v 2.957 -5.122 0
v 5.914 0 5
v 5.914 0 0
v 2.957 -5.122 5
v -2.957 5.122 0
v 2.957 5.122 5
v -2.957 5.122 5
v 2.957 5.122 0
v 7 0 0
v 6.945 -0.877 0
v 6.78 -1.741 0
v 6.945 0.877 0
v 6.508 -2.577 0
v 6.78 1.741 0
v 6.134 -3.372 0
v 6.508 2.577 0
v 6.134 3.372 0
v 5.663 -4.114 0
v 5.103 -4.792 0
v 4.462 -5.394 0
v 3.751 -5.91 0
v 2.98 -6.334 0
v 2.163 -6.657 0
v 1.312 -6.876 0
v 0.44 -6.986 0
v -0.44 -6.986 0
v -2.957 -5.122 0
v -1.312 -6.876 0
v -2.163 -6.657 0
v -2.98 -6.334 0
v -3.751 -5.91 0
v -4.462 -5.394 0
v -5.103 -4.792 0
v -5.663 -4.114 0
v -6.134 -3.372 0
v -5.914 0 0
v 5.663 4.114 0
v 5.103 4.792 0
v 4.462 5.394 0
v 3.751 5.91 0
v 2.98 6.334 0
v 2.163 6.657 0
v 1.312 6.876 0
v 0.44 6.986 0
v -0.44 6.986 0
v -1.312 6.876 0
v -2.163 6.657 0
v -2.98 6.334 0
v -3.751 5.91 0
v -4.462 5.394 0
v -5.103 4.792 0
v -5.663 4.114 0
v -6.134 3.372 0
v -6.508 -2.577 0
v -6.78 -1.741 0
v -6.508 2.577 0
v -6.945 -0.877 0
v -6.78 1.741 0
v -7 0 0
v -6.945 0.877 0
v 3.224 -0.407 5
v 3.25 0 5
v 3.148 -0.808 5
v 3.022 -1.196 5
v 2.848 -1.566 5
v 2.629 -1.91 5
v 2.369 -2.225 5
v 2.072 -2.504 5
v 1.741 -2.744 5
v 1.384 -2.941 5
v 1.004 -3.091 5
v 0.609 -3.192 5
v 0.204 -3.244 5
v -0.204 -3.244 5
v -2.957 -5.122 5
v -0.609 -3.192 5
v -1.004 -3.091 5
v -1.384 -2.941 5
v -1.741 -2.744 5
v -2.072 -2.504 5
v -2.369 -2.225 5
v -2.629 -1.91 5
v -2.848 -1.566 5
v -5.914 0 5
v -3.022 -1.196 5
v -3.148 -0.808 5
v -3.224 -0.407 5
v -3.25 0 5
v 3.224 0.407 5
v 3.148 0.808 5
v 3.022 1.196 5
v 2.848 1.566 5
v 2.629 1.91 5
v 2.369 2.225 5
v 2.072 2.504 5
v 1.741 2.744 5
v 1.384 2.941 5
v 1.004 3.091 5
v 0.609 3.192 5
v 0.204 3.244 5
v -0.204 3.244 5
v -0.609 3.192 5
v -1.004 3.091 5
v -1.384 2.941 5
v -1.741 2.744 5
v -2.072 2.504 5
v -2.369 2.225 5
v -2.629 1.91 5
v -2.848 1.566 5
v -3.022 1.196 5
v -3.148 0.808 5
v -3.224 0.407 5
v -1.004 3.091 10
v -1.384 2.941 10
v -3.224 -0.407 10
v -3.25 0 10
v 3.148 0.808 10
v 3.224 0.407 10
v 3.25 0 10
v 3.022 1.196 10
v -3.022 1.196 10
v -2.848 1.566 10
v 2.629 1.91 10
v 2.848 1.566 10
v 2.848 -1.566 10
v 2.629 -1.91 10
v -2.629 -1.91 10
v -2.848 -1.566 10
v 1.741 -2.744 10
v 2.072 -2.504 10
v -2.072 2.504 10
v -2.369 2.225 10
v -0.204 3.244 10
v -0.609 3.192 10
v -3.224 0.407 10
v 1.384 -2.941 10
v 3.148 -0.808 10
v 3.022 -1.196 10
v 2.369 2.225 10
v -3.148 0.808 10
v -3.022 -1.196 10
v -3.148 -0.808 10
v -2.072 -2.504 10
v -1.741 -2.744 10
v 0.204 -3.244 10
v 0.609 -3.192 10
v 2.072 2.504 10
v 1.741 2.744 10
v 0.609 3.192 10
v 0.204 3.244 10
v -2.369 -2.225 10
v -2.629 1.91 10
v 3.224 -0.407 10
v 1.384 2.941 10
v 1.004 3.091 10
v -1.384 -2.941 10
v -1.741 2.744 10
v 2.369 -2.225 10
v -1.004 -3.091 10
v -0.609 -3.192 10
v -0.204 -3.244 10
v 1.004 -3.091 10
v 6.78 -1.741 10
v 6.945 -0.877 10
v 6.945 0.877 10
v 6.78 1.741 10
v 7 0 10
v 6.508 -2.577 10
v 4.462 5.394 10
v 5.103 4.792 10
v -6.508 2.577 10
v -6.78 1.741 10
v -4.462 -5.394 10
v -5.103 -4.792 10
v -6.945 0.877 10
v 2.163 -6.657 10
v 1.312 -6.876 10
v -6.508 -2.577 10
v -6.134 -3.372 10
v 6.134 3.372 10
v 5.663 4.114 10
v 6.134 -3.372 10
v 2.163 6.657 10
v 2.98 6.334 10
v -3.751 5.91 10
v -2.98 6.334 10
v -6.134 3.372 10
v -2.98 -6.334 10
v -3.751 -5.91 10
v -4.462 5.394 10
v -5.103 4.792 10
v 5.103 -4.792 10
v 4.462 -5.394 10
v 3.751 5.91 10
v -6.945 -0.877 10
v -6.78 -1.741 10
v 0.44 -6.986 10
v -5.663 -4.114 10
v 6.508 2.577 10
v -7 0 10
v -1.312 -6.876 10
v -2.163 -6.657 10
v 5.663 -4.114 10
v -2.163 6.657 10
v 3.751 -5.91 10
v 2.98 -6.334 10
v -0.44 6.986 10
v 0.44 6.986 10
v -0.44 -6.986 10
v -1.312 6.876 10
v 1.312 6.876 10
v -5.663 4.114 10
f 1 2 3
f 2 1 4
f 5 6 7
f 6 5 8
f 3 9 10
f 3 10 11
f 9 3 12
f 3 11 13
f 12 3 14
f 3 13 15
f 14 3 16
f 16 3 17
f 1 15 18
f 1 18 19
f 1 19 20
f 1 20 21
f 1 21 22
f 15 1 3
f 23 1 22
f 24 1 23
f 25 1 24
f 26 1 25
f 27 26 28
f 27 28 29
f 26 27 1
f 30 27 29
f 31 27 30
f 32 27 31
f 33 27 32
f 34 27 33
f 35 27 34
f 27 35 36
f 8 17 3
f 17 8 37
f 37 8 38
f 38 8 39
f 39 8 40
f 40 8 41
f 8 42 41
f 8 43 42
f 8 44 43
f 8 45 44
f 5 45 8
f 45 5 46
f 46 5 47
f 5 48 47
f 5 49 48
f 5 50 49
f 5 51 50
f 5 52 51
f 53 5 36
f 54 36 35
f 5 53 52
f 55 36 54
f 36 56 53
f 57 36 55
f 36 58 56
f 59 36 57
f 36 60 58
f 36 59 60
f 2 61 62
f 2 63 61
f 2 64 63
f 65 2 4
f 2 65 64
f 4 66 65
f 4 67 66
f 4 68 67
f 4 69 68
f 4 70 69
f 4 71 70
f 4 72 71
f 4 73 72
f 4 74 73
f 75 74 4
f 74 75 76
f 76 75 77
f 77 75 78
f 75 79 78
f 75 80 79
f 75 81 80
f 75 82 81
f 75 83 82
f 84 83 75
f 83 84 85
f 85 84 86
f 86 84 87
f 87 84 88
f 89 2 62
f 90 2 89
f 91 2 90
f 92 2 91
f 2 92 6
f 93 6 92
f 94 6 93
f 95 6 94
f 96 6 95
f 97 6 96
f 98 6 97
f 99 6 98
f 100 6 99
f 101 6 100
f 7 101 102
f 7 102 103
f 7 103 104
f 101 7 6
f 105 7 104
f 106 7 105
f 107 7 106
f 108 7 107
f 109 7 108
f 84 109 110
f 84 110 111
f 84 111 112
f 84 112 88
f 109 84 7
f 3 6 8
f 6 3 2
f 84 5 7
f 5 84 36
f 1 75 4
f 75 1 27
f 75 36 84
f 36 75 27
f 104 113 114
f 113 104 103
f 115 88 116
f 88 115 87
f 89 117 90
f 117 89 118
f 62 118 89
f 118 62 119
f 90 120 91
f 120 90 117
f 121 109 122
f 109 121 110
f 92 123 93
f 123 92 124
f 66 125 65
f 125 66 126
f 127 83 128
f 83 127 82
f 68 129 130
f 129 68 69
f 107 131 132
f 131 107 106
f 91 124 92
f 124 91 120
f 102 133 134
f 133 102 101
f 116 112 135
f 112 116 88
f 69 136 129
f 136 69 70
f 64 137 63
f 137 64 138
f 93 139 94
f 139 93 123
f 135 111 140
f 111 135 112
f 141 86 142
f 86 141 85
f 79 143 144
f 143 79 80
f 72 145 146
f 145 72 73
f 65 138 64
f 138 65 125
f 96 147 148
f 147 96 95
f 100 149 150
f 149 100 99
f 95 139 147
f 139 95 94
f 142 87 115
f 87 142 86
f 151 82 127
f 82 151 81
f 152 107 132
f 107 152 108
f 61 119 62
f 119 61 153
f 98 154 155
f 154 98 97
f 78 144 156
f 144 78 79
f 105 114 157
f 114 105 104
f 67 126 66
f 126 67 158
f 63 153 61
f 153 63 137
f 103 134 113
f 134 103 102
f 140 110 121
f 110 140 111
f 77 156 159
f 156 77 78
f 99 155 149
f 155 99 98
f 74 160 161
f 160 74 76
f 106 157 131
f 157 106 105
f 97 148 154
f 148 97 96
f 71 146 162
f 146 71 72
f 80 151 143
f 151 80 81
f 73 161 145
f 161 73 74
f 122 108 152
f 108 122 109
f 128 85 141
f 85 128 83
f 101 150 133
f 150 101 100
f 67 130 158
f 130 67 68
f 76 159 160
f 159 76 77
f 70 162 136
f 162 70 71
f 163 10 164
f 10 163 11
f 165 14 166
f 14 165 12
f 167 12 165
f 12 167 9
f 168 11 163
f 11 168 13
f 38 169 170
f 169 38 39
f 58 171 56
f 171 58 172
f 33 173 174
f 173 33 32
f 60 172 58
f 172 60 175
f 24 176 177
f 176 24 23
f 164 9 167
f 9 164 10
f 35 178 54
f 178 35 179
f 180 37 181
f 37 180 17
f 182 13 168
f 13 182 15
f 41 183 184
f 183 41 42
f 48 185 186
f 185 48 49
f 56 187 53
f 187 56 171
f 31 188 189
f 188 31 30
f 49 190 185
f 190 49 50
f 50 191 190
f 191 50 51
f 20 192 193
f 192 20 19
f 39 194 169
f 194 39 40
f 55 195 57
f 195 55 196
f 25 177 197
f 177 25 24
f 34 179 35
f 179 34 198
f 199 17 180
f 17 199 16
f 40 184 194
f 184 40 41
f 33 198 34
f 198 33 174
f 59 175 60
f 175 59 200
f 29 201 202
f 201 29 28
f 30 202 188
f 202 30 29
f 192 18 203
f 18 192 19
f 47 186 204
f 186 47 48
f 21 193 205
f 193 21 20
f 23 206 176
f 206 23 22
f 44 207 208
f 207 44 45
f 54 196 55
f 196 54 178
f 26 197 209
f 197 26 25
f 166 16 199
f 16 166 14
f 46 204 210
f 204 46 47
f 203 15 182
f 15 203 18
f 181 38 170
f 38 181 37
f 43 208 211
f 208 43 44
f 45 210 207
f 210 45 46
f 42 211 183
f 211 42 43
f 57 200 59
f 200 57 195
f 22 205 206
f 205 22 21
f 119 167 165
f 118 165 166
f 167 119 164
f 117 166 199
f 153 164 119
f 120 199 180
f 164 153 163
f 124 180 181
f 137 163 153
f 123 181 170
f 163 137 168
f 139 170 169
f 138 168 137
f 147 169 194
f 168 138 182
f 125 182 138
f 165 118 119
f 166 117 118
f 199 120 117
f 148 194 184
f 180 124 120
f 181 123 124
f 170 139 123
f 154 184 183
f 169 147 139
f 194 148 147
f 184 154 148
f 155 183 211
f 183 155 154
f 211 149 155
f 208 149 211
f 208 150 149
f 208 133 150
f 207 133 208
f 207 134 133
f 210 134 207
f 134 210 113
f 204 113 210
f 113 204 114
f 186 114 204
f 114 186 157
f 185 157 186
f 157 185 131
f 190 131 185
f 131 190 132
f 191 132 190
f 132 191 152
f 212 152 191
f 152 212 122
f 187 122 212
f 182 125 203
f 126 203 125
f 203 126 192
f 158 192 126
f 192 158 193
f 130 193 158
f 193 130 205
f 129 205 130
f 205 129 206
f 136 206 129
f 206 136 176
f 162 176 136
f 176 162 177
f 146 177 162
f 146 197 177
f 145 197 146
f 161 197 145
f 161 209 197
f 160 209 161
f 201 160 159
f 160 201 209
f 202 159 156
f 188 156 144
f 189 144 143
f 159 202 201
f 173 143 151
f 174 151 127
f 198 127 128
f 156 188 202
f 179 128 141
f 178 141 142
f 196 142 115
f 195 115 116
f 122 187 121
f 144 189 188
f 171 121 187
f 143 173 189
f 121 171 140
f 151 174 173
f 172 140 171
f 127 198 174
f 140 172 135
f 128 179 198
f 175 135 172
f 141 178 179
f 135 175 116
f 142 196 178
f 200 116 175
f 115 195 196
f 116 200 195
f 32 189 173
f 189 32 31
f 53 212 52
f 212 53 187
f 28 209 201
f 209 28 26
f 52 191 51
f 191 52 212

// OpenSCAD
$fn = 50;


difference() {
	union() {
		cylinder(h = 10, r = 7.0000000000);
	}
	union() {
		translate(v = [0, 0, 0]) {
			rotate(a = [0, 0, 0]) {
				difference() {
					union() {
						#linear_extrude(height = 5) {
							polygon(points = [[5.9142500000, 0.0000000000], [2.9571250000, 5.1218907443], [-2.9571250000, 5.1218907443], [-5.9142500000, 0.0000000000], [-2.9571250000, -5.1218907443], [2.9571250000, -5.1218907443]]);
						}
					}
					union();
				}
			}
		}
		translate(v = [0, 0, -100]) {
			cylinder(h = 200, r = 3.2500000000);
		}
		translate(v = [0, 0, -100]) {
			cylinder(h = 200, r = 1.8000000000);
		}
	}
}
